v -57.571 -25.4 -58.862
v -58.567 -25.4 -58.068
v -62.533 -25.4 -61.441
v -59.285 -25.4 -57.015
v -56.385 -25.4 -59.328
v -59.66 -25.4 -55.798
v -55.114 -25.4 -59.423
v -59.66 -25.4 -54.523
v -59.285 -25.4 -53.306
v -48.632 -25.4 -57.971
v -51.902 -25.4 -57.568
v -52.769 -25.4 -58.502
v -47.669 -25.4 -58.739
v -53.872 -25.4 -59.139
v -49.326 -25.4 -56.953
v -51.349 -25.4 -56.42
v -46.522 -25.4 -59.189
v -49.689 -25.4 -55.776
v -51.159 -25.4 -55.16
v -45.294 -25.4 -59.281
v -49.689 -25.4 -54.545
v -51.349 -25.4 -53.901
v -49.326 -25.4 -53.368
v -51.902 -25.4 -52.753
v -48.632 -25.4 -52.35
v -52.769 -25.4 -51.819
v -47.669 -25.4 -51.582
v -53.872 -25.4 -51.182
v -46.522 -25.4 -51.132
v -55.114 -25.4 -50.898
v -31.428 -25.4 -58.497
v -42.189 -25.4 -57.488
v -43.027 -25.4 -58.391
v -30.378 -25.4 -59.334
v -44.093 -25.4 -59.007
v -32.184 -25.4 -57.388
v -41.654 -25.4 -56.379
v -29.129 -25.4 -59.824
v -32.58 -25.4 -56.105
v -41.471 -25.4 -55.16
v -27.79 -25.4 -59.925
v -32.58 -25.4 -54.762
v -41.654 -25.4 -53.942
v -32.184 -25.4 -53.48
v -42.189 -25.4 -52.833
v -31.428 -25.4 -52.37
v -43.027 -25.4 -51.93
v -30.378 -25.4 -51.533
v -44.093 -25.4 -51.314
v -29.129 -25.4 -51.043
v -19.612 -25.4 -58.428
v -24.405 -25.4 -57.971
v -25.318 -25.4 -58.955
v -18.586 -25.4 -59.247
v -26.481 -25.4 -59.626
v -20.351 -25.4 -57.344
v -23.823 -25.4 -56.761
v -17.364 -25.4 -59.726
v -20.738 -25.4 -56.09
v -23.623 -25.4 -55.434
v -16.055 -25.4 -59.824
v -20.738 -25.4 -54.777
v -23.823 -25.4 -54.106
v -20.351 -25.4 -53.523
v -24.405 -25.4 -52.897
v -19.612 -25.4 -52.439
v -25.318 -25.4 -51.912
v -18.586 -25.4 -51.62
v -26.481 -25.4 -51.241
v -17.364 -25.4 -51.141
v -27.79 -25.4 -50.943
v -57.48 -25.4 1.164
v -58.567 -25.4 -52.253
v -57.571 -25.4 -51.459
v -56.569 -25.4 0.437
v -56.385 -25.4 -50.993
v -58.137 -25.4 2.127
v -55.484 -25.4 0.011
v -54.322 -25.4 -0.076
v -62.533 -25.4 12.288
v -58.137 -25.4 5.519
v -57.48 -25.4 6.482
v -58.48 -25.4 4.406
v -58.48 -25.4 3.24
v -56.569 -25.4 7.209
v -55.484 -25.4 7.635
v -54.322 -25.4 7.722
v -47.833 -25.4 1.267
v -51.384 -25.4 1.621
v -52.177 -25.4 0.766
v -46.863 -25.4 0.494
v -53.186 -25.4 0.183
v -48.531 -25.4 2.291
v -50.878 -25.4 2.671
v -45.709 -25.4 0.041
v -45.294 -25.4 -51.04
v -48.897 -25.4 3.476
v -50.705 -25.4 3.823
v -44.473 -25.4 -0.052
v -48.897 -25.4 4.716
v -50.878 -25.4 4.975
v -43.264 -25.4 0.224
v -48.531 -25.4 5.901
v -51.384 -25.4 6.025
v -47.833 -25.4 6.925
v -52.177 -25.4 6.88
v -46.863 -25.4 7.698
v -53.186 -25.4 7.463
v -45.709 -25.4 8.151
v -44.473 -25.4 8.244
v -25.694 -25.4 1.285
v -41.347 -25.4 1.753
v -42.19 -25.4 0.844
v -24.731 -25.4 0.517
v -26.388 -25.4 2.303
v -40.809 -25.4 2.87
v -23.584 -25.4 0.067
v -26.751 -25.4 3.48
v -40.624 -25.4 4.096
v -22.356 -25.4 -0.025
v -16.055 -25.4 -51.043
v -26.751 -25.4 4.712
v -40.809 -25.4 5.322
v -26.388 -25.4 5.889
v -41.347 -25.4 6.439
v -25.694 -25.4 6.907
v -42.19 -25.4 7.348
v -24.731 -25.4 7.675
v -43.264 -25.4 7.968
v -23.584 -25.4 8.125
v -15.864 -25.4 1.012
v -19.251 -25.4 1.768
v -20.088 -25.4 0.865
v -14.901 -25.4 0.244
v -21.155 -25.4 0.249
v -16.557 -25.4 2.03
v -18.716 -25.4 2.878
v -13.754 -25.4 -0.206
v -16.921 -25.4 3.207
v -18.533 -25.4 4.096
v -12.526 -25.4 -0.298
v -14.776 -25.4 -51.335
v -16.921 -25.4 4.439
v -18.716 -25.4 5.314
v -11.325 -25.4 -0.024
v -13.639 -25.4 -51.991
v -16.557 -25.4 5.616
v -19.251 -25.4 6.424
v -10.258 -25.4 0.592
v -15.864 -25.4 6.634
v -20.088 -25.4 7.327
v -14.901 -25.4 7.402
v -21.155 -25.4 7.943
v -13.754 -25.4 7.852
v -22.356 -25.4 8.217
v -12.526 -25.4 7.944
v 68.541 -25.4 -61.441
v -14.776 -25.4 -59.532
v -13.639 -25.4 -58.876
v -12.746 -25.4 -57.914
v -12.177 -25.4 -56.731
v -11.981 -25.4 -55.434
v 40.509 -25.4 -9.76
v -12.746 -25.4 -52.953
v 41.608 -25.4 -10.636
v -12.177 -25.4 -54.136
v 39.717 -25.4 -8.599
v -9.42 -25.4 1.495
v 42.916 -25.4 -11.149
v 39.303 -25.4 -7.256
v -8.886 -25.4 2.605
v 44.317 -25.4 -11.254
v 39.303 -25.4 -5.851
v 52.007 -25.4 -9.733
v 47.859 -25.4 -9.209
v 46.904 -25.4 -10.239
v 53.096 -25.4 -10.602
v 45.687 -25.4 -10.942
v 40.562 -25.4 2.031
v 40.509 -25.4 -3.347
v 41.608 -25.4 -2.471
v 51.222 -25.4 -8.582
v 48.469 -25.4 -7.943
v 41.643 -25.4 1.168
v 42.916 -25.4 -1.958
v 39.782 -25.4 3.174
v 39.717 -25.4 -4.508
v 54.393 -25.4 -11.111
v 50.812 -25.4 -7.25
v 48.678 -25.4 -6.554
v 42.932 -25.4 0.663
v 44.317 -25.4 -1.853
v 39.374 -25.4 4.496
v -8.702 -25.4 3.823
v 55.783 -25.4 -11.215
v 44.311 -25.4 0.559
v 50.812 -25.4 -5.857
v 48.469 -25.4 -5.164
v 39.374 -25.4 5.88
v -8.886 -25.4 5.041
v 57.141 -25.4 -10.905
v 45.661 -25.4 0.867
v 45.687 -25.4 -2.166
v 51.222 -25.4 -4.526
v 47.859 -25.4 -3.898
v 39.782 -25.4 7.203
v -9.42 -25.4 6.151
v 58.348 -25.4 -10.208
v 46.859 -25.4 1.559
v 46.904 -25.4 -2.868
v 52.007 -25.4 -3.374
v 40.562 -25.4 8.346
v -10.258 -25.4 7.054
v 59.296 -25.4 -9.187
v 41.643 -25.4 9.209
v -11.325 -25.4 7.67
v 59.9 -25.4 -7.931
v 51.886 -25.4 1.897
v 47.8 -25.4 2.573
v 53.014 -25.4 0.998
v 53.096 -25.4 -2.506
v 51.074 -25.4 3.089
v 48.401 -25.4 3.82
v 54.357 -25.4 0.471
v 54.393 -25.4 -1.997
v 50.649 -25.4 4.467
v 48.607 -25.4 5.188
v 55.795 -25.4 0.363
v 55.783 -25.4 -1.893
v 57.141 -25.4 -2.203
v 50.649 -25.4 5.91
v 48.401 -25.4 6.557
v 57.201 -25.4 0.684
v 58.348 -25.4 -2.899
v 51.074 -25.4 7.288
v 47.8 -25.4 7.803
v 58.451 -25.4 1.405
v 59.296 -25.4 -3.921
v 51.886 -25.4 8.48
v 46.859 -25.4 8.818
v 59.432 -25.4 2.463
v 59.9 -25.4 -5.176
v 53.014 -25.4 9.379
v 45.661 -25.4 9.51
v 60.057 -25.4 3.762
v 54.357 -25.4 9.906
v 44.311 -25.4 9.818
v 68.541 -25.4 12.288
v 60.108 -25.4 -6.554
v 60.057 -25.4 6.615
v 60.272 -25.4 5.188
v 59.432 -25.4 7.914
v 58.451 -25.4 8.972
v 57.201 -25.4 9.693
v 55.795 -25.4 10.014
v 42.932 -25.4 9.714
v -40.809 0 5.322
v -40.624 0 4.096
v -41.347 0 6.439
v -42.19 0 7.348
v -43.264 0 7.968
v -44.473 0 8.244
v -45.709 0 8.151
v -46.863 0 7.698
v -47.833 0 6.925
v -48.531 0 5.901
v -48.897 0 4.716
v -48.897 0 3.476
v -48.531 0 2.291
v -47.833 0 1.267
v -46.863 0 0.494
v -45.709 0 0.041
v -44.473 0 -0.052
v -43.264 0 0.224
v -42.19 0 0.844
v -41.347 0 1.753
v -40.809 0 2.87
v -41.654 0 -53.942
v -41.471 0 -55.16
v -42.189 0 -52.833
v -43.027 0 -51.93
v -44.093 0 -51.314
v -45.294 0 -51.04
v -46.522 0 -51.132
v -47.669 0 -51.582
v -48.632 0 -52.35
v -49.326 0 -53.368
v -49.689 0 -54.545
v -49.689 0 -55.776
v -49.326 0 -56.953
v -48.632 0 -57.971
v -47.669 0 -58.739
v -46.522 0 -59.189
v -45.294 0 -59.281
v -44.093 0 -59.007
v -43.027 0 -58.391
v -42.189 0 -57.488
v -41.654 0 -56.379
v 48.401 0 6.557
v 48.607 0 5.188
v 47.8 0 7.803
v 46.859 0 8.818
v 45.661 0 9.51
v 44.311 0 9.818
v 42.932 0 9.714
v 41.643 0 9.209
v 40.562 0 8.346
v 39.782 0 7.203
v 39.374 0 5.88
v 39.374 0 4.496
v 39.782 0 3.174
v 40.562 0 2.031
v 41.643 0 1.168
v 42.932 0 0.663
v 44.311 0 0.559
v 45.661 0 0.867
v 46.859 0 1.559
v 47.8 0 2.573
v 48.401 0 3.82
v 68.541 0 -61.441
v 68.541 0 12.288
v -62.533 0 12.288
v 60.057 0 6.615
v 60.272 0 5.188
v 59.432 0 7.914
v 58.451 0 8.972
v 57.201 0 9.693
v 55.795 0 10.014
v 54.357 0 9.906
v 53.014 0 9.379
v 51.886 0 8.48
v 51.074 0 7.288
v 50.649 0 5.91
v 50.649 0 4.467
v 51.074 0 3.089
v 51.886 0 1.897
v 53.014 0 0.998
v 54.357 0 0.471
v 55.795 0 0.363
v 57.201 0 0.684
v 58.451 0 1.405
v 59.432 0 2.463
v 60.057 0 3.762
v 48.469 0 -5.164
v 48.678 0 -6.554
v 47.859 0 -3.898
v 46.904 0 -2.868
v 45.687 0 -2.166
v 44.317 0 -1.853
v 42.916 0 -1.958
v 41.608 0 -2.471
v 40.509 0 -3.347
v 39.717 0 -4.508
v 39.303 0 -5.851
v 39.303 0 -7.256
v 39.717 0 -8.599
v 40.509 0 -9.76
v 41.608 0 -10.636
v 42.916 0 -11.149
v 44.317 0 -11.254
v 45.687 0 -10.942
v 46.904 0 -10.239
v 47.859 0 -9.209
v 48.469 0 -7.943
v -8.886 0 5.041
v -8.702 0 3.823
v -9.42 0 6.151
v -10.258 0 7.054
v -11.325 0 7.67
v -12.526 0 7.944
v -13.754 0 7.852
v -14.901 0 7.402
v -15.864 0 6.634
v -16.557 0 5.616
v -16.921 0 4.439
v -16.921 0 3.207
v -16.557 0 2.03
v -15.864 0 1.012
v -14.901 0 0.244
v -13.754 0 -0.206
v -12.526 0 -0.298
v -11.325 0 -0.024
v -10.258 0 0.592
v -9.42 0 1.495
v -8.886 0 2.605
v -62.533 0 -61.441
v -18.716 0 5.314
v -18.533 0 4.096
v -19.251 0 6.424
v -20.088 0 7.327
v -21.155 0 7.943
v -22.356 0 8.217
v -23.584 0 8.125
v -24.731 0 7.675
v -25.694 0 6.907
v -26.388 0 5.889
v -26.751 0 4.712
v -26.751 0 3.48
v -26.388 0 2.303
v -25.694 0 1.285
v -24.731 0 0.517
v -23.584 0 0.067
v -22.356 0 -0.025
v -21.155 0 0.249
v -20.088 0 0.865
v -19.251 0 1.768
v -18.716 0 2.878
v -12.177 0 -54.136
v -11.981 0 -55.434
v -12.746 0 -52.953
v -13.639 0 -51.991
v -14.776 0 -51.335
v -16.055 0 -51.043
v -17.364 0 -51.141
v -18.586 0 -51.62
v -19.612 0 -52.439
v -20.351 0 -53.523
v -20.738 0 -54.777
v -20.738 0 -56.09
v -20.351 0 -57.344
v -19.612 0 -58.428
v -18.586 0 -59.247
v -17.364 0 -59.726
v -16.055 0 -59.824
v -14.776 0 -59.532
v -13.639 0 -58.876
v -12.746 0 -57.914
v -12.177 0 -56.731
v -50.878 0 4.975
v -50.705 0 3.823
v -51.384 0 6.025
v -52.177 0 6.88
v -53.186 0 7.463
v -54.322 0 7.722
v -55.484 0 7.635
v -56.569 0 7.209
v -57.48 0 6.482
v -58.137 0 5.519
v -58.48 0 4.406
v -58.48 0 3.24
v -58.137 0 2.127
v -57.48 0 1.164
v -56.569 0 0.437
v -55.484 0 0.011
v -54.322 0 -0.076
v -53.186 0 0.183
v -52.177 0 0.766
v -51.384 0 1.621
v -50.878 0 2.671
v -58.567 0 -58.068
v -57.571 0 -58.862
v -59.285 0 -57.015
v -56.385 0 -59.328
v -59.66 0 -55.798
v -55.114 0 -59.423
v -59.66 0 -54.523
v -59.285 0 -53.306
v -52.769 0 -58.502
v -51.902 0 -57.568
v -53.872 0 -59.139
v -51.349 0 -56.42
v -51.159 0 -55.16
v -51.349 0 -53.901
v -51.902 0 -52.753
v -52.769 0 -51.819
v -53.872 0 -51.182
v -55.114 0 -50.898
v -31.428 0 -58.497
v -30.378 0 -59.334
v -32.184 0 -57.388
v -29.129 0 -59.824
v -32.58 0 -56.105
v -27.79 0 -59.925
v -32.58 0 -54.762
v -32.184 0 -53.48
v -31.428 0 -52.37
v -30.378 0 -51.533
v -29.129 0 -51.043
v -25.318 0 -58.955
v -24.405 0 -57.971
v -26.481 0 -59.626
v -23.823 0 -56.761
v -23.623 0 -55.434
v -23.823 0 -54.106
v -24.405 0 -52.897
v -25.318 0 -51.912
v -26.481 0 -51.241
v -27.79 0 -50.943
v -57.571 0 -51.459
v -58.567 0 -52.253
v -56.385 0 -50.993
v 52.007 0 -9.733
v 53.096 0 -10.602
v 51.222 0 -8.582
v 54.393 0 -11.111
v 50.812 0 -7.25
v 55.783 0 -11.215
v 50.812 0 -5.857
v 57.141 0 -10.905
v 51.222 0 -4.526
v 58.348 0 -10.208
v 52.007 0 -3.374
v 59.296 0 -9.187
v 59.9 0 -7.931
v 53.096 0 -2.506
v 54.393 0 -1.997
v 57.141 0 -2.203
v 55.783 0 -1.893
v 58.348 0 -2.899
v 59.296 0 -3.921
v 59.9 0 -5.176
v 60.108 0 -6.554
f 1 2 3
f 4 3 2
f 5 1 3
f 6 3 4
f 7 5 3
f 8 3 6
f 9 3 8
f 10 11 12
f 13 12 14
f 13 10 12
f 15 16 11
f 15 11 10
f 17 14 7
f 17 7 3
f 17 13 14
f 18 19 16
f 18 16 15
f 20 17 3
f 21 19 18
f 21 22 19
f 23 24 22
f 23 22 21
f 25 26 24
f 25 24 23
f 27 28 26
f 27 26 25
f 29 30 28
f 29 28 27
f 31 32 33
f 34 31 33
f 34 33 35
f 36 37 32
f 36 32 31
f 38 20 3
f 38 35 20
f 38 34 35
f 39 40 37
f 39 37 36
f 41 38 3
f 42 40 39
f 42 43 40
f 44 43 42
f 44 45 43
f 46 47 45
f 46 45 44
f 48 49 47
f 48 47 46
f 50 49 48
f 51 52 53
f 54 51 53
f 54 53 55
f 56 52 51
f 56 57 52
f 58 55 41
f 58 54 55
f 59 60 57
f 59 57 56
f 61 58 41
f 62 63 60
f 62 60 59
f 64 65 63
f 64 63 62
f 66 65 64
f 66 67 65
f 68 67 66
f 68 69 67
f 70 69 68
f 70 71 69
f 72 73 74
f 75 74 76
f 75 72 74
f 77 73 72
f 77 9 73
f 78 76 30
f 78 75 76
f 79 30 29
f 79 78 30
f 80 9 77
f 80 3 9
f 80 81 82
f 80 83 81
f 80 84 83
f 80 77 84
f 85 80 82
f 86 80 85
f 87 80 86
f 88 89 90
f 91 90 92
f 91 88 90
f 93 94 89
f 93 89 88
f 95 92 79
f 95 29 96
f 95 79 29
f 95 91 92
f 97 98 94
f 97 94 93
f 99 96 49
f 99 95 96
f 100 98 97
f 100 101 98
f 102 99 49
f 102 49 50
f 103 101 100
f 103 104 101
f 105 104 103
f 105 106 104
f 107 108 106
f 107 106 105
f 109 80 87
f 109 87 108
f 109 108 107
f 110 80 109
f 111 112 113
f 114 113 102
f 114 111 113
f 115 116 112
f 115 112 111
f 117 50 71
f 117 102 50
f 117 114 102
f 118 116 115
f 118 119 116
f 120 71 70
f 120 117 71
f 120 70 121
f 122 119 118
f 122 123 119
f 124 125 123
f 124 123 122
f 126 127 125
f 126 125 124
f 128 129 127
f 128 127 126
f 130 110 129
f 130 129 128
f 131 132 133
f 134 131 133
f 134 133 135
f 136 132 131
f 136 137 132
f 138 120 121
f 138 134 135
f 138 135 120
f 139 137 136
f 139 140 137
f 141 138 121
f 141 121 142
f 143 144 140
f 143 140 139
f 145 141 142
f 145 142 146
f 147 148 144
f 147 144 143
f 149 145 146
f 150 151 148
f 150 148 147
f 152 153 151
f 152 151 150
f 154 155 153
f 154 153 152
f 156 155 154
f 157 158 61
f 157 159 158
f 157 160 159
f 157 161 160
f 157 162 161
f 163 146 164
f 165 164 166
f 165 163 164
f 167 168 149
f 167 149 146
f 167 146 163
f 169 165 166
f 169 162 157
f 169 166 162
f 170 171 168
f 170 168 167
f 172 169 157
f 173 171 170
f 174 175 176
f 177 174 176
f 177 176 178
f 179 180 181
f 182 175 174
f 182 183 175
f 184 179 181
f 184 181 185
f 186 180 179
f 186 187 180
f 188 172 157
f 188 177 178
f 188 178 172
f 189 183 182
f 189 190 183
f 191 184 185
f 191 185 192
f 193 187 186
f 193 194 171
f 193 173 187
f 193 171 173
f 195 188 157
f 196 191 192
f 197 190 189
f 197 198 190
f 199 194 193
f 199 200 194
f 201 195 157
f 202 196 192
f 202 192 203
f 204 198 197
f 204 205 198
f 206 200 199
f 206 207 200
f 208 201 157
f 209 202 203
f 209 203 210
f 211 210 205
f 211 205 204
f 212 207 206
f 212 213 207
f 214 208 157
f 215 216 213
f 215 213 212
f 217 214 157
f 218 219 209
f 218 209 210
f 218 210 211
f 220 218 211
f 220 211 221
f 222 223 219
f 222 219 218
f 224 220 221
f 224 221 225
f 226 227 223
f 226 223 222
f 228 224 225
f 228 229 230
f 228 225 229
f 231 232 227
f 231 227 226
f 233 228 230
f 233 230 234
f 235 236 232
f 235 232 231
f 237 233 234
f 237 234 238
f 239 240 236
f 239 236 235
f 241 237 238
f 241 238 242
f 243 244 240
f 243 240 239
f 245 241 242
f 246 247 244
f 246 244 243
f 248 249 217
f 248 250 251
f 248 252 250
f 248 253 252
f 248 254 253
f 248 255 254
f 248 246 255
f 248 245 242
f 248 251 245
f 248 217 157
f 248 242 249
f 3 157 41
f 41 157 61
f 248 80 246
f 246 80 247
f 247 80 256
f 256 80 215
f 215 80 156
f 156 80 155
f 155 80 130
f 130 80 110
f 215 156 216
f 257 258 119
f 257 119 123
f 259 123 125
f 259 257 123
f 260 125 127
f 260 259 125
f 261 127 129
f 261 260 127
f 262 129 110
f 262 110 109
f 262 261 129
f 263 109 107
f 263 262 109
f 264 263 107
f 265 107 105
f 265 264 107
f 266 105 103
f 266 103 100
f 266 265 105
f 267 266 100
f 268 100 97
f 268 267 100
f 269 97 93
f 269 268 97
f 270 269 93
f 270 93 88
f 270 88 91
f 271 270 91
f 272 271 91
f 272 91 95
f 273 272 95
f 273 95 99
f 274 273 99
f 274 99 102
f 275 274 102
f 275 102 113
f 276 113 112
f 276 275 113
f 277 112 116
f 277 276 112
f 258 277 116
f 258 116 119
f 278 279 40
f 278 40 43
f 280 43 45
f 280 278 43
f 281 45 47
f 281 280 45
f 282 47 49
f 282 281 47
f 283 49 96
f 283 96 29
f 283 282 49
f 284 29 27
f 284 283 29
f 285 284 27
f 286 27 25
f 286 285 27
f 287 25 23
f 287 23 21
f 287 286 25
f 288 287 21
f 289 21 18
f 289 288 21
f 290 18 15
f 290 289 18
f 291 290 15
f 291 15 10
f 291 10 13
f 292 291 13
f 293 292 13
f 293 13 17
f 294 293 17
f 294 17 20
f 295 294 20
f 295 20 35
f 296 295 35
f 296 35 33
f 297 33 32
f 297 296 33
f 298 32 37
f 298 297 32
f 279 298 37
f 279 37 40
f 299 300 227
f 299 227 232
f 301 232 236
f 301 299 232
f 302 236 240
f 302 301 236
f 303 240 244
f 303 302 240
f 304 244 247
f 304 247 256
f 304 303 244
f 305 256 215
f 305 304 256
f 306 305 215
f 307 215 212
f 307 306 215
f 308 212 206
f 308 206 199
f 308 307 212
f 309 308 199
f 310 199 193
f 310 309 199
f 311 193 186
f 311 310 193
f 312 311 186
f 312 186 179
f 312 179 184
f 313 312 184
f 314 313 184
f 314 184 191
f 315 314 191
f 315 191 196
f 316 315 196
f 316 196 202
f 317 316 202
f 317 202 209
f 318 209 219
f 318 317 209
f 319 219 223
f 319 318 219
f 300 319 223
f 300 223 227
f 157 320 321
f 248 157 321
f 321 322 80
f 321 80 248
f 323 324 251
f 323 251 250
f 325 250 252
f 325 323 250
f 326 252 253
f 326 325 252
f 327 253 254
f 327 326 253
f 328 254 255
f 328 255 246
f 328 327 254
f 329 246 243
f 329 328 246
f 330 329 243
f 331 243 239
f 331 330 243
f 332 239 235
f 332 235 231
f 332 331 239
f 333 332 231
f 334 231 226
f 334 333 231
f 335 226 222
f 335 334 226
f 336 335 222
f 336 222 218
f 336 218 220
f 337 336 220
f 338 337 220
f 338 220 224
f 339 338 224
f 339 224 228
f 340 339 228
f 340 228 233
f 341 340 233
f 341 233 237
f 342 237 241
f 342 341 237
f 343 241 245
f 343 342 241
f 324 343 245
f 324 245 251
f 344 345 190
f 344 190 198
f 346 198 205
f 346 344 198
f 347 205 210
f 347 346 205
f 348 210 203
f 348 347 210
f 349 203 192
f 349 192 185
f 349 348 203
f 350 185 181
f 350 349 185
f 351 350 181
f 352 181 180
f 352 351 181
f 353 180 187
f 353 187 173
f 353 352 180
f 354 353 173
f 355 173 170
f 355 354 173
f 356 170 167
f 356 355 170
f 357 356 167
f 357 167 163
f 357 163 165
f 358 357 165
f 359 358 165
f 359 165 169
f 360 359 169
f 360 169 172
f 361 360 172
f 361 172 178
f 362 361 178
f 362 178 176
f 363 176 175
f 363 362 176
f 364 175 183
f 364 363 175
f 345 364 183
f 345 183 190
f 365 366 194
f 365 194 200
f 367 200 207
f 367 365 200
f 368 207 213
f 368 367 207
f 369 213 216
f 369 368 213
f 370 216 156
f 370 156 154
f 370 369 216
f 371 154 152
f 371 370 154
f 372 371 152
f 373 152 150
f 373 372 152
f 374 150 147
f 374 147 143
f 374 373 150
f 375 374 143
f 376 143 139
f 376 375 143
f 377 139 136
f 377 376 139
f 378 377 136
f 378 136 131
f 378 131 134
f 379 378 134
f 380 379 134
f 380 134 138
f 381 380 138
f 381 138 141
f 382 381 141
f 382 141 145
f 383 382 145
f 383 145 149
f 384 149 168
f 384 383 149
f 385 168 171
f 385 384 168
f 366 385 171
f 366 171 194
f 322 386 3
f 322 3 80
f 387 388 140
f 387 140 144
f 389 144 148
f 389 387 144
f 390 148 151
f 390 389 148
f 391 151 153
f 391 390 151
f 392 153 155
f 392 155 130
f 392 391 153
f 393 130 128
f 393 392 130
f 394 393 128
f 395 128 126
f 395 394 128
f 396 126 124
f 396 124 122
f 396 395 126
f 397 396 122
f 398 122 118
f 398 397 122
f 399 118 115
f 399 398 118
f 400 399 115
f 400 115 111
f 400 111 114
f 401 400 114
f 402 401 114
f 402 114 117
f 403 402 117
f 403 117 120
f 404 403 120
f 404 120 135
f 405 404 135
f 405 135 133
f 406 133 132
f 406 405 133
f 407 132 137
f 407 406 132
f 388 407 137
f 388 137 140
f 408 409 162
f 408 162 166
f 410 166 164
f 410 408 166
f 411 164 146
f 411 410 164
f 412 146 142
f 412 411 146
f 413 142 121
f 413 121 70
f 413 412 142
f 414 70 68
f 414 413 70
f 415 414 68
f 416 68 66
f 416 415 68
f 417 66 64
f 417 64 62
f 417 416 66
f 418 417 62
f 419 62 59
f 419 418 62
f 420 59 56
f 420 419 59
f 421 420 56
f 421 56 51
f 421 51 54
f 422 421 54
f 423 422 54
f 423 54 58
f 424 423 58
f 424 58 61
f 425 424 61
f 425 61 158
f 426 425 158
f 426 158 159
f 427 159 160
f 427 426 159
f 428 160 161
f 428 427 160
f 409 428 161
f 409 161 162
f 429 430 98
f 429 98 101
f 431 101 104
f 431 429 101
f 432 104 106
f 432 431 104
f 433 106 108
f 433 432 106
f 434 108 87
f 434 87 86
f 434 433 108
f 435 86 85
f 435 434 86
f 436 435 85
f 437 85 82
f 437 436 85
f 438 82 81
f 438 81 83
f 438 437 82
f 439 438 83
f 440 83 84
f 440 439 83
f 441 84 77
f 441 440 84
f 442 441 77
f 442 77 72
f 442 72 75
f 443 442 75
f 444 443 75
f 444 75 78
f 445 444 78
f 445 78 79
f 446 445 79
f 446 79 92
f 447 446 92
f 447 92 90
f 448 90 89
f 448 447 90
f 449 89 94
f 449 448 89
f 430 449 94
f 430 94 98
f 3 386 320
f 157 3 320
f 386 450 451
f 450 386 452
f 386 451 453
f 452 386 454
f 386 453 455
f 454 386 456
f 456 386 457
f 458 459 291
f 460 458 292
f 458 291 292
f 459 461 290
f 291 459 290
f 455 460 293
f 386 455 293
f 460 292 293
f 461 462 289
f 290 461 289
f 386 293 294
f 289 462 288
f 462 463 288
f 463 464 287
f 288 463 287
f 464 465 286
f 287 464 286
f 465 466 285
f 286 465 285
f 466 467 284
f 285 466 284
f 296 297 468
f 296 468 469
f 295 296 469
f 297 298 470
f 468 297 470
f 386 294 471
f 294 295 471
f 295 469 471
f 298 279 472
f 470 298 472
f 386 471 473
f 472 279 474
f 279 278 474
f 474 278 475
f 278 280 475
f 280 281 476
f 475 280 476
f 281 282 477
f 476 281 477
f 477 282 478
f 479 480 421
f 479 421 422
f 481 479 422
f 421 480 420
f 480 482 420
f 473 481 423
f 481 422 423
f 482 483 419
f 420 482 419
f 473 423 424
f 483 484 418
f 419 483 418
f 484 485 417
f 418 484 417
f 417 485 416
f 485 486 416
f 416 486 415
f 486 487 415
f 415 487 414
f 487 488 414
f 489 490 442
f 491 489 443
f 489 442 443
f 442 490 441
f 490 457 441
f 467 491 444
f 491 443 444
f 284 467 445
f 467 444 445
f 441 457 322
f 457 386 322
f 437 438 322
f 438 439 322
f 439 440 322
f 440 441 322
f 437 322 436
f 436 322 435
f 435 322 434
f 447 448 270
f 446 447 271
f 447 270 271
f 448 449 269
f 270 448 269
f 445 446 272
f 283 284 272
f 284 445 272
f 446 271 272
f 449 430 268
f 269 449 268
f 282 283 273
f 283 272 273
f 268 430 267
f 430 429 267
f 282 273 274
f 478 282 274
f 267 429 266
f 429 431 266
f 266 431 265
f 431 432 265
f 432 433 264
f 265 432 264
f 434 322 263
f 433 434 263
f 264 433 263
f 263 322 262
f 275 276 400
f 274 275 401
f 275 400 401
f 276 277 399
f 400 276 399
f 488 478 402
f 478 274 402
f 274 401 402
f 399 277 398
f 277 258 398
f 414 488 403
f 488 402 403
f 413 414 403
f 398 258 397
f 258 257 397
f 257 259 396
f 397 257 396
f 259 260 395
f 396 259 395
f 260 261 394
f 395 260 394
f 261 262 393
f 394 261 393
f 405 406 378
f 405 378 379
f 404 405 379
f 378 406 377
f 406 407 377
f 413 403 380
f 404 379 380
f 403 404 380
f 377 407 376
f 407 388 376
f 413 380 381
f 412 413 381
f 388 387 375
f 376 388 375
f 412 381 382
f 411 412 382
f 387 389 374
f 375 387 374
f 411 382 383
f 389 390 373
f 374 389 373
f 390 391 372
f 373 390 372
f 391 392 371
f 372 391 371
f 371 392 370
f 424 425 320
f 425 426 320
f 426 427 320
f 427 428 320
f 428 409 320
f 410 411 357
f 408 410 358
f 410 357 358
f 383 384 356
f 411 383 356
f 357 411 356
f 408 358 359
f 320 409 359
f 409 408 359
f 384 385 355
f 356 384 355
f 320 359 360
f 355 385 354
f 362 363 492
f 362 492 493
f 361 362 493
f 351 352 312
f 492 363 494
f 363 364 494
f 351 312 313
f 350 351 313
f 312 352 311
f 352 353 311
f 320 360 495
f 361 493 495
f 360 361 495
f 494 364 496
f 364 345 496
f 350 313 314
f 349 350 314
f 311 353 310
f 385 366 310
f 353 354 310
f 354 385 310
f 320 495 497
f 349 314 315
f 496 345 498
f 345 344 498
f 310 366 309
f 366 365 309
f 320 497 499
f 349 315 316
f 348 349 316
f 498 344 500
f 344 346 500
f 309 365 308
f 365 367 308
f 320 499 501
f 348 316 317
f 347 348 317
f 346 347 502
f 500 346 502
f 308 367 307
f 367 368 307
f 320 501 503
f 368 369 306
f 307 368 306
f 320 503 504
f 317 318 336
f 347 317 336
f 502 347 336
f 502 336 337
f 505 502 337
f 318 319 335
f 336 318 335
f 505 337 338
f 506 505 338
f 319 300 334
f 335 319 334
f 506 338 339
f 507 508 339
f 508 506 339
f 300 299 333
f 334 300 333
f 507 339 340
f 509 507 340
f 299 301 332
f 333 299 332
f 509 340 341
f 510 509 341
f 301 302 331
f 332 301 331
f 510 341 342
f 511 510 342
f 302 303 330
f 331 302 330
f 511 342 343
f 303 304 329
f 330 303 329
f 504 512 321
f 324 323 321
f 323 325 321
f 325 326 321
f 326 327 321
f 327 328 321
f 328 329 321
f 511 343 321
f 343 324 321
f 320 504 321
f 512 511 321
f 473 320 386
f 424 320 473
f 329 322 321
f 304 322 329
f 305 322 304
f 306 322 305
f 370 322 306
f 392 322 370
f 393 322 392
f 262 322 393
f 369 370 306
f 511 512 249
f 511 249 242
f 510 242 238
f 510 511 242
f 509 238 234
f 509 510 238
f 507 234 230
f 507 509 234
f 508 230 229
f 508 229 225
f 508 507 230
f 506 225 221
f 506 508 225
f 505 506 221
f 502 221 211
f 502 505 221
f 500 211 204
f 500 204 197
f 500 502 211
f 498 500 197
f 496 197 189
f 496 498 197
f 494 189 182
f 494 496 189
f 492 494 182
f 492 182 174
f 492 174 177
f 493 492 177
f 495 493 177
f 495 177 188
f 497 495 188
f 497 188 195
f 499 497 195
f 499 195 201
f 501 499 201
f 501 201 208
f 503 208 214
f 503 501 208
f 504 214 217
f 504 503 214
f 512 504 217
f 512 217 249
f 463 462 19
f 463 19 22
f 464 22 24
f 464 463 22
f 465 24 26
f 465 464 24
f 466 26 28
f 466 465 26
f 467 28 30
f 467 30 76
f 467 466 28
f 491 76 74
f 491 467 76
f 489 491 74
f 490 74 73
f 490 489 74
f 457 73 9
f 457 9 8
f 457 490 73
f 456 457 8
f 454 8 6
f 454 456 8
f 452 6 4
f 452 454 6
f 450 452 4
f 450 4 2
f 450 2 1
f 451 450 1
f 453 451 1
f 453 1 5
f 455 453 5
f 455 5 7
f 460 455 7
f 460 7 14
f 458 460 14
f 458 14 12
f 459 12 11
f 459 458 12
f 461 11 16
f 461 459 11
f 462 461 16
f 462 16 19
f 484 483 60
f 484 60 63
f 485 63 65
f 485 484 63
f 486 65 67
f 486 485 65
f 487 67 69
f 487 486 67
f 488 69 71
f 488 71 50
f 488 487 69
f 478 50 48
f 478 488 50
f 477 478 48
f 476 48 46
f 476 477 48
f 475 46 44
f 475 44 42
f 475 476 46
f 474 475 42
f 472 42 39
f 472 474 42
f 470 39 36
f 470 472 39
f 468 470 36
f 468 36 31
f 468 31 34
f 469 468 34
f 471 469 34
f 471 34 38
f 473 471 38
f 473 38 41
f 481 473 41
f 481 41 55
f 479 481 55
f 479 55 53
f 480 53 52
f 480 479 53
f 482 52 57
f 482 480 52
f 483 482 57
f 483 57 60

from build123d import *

# Parameters (mm, degrees)
F0_W     = 131.074406
F0_H     = 73.729352
F0_R     = 4.274249
F0_R_2   = 4.132324
F0_R_3   = 4.503614
F0_R_4   = 4.403148
F0_R_5   = 3.909793
F0_R_6   = 4.159305
F0_R_7   = 4.132325
F0_R_8   = 4.713948
F0_R_9   = 4.674234
F0_R_10  = 4.642219
F0_R_11  = 4.838842
F1_DEPTH = 25.4


with BuildPart() as f1:
    # F0 (on Front) → F1 (new body)
    with BuildSketch(Plane.XZ):
        with Locations((3.003787, -24.576451)):
            Rectangle(F0_W, F0_H)
        with Locations((-55.433549, -55.160478)):
            Circle(F0_R, mode=Mode.SUBTRACT)
        with Locations((-45.60297, -55.160478)):
            Circle(F0_R_2, mode=Mode.SUBTRACT)
        with Locations((-28.126383, -55.433549)):
            Circle(F0_R_3, mode=Mode.SUBTRACT)
        with Locations((-16.3843, -55.433549)):
            Circle(F0_R_4, mode=Mode.SUBTRACT)
        with Locations((-54.614335, 3.823003)):
            Circle(F0_R_5, mode=Mode.SUBTRACT)
        with Locations((-44.783756, 4.096075)):
            Circle(F0_R_6, mode=Mode.SUBTRACT)
        with Locations((-22.664949, 4.096075)):
            Circle(F0_R_7, mode=Mode.SUBTRACT)
        with Locations((-12.834369, 3.823003)):
            Circle(F0_R_2, mode=Mode.SUBTRACT)
        with Locations((43.964539, -6.553721)):
            Circle(F0_R_8, mode=Mode.SUBTRACT)
        with Locations((55.433553, -6.553721)):
            Circle(F0_R_9, mode=Mode.SUBTRACT)
        with Locations((43.964539, 5.188362)):
            Circle(F0_R_10, mode=Mode.SUBTRACT)
        with Locations((55.433553, 5.188362)):
            Circle(F0_R_11, mode=Mode.SUBTRACT)
    extrude(amount=F1_DEPTH)


solid = f1.part
